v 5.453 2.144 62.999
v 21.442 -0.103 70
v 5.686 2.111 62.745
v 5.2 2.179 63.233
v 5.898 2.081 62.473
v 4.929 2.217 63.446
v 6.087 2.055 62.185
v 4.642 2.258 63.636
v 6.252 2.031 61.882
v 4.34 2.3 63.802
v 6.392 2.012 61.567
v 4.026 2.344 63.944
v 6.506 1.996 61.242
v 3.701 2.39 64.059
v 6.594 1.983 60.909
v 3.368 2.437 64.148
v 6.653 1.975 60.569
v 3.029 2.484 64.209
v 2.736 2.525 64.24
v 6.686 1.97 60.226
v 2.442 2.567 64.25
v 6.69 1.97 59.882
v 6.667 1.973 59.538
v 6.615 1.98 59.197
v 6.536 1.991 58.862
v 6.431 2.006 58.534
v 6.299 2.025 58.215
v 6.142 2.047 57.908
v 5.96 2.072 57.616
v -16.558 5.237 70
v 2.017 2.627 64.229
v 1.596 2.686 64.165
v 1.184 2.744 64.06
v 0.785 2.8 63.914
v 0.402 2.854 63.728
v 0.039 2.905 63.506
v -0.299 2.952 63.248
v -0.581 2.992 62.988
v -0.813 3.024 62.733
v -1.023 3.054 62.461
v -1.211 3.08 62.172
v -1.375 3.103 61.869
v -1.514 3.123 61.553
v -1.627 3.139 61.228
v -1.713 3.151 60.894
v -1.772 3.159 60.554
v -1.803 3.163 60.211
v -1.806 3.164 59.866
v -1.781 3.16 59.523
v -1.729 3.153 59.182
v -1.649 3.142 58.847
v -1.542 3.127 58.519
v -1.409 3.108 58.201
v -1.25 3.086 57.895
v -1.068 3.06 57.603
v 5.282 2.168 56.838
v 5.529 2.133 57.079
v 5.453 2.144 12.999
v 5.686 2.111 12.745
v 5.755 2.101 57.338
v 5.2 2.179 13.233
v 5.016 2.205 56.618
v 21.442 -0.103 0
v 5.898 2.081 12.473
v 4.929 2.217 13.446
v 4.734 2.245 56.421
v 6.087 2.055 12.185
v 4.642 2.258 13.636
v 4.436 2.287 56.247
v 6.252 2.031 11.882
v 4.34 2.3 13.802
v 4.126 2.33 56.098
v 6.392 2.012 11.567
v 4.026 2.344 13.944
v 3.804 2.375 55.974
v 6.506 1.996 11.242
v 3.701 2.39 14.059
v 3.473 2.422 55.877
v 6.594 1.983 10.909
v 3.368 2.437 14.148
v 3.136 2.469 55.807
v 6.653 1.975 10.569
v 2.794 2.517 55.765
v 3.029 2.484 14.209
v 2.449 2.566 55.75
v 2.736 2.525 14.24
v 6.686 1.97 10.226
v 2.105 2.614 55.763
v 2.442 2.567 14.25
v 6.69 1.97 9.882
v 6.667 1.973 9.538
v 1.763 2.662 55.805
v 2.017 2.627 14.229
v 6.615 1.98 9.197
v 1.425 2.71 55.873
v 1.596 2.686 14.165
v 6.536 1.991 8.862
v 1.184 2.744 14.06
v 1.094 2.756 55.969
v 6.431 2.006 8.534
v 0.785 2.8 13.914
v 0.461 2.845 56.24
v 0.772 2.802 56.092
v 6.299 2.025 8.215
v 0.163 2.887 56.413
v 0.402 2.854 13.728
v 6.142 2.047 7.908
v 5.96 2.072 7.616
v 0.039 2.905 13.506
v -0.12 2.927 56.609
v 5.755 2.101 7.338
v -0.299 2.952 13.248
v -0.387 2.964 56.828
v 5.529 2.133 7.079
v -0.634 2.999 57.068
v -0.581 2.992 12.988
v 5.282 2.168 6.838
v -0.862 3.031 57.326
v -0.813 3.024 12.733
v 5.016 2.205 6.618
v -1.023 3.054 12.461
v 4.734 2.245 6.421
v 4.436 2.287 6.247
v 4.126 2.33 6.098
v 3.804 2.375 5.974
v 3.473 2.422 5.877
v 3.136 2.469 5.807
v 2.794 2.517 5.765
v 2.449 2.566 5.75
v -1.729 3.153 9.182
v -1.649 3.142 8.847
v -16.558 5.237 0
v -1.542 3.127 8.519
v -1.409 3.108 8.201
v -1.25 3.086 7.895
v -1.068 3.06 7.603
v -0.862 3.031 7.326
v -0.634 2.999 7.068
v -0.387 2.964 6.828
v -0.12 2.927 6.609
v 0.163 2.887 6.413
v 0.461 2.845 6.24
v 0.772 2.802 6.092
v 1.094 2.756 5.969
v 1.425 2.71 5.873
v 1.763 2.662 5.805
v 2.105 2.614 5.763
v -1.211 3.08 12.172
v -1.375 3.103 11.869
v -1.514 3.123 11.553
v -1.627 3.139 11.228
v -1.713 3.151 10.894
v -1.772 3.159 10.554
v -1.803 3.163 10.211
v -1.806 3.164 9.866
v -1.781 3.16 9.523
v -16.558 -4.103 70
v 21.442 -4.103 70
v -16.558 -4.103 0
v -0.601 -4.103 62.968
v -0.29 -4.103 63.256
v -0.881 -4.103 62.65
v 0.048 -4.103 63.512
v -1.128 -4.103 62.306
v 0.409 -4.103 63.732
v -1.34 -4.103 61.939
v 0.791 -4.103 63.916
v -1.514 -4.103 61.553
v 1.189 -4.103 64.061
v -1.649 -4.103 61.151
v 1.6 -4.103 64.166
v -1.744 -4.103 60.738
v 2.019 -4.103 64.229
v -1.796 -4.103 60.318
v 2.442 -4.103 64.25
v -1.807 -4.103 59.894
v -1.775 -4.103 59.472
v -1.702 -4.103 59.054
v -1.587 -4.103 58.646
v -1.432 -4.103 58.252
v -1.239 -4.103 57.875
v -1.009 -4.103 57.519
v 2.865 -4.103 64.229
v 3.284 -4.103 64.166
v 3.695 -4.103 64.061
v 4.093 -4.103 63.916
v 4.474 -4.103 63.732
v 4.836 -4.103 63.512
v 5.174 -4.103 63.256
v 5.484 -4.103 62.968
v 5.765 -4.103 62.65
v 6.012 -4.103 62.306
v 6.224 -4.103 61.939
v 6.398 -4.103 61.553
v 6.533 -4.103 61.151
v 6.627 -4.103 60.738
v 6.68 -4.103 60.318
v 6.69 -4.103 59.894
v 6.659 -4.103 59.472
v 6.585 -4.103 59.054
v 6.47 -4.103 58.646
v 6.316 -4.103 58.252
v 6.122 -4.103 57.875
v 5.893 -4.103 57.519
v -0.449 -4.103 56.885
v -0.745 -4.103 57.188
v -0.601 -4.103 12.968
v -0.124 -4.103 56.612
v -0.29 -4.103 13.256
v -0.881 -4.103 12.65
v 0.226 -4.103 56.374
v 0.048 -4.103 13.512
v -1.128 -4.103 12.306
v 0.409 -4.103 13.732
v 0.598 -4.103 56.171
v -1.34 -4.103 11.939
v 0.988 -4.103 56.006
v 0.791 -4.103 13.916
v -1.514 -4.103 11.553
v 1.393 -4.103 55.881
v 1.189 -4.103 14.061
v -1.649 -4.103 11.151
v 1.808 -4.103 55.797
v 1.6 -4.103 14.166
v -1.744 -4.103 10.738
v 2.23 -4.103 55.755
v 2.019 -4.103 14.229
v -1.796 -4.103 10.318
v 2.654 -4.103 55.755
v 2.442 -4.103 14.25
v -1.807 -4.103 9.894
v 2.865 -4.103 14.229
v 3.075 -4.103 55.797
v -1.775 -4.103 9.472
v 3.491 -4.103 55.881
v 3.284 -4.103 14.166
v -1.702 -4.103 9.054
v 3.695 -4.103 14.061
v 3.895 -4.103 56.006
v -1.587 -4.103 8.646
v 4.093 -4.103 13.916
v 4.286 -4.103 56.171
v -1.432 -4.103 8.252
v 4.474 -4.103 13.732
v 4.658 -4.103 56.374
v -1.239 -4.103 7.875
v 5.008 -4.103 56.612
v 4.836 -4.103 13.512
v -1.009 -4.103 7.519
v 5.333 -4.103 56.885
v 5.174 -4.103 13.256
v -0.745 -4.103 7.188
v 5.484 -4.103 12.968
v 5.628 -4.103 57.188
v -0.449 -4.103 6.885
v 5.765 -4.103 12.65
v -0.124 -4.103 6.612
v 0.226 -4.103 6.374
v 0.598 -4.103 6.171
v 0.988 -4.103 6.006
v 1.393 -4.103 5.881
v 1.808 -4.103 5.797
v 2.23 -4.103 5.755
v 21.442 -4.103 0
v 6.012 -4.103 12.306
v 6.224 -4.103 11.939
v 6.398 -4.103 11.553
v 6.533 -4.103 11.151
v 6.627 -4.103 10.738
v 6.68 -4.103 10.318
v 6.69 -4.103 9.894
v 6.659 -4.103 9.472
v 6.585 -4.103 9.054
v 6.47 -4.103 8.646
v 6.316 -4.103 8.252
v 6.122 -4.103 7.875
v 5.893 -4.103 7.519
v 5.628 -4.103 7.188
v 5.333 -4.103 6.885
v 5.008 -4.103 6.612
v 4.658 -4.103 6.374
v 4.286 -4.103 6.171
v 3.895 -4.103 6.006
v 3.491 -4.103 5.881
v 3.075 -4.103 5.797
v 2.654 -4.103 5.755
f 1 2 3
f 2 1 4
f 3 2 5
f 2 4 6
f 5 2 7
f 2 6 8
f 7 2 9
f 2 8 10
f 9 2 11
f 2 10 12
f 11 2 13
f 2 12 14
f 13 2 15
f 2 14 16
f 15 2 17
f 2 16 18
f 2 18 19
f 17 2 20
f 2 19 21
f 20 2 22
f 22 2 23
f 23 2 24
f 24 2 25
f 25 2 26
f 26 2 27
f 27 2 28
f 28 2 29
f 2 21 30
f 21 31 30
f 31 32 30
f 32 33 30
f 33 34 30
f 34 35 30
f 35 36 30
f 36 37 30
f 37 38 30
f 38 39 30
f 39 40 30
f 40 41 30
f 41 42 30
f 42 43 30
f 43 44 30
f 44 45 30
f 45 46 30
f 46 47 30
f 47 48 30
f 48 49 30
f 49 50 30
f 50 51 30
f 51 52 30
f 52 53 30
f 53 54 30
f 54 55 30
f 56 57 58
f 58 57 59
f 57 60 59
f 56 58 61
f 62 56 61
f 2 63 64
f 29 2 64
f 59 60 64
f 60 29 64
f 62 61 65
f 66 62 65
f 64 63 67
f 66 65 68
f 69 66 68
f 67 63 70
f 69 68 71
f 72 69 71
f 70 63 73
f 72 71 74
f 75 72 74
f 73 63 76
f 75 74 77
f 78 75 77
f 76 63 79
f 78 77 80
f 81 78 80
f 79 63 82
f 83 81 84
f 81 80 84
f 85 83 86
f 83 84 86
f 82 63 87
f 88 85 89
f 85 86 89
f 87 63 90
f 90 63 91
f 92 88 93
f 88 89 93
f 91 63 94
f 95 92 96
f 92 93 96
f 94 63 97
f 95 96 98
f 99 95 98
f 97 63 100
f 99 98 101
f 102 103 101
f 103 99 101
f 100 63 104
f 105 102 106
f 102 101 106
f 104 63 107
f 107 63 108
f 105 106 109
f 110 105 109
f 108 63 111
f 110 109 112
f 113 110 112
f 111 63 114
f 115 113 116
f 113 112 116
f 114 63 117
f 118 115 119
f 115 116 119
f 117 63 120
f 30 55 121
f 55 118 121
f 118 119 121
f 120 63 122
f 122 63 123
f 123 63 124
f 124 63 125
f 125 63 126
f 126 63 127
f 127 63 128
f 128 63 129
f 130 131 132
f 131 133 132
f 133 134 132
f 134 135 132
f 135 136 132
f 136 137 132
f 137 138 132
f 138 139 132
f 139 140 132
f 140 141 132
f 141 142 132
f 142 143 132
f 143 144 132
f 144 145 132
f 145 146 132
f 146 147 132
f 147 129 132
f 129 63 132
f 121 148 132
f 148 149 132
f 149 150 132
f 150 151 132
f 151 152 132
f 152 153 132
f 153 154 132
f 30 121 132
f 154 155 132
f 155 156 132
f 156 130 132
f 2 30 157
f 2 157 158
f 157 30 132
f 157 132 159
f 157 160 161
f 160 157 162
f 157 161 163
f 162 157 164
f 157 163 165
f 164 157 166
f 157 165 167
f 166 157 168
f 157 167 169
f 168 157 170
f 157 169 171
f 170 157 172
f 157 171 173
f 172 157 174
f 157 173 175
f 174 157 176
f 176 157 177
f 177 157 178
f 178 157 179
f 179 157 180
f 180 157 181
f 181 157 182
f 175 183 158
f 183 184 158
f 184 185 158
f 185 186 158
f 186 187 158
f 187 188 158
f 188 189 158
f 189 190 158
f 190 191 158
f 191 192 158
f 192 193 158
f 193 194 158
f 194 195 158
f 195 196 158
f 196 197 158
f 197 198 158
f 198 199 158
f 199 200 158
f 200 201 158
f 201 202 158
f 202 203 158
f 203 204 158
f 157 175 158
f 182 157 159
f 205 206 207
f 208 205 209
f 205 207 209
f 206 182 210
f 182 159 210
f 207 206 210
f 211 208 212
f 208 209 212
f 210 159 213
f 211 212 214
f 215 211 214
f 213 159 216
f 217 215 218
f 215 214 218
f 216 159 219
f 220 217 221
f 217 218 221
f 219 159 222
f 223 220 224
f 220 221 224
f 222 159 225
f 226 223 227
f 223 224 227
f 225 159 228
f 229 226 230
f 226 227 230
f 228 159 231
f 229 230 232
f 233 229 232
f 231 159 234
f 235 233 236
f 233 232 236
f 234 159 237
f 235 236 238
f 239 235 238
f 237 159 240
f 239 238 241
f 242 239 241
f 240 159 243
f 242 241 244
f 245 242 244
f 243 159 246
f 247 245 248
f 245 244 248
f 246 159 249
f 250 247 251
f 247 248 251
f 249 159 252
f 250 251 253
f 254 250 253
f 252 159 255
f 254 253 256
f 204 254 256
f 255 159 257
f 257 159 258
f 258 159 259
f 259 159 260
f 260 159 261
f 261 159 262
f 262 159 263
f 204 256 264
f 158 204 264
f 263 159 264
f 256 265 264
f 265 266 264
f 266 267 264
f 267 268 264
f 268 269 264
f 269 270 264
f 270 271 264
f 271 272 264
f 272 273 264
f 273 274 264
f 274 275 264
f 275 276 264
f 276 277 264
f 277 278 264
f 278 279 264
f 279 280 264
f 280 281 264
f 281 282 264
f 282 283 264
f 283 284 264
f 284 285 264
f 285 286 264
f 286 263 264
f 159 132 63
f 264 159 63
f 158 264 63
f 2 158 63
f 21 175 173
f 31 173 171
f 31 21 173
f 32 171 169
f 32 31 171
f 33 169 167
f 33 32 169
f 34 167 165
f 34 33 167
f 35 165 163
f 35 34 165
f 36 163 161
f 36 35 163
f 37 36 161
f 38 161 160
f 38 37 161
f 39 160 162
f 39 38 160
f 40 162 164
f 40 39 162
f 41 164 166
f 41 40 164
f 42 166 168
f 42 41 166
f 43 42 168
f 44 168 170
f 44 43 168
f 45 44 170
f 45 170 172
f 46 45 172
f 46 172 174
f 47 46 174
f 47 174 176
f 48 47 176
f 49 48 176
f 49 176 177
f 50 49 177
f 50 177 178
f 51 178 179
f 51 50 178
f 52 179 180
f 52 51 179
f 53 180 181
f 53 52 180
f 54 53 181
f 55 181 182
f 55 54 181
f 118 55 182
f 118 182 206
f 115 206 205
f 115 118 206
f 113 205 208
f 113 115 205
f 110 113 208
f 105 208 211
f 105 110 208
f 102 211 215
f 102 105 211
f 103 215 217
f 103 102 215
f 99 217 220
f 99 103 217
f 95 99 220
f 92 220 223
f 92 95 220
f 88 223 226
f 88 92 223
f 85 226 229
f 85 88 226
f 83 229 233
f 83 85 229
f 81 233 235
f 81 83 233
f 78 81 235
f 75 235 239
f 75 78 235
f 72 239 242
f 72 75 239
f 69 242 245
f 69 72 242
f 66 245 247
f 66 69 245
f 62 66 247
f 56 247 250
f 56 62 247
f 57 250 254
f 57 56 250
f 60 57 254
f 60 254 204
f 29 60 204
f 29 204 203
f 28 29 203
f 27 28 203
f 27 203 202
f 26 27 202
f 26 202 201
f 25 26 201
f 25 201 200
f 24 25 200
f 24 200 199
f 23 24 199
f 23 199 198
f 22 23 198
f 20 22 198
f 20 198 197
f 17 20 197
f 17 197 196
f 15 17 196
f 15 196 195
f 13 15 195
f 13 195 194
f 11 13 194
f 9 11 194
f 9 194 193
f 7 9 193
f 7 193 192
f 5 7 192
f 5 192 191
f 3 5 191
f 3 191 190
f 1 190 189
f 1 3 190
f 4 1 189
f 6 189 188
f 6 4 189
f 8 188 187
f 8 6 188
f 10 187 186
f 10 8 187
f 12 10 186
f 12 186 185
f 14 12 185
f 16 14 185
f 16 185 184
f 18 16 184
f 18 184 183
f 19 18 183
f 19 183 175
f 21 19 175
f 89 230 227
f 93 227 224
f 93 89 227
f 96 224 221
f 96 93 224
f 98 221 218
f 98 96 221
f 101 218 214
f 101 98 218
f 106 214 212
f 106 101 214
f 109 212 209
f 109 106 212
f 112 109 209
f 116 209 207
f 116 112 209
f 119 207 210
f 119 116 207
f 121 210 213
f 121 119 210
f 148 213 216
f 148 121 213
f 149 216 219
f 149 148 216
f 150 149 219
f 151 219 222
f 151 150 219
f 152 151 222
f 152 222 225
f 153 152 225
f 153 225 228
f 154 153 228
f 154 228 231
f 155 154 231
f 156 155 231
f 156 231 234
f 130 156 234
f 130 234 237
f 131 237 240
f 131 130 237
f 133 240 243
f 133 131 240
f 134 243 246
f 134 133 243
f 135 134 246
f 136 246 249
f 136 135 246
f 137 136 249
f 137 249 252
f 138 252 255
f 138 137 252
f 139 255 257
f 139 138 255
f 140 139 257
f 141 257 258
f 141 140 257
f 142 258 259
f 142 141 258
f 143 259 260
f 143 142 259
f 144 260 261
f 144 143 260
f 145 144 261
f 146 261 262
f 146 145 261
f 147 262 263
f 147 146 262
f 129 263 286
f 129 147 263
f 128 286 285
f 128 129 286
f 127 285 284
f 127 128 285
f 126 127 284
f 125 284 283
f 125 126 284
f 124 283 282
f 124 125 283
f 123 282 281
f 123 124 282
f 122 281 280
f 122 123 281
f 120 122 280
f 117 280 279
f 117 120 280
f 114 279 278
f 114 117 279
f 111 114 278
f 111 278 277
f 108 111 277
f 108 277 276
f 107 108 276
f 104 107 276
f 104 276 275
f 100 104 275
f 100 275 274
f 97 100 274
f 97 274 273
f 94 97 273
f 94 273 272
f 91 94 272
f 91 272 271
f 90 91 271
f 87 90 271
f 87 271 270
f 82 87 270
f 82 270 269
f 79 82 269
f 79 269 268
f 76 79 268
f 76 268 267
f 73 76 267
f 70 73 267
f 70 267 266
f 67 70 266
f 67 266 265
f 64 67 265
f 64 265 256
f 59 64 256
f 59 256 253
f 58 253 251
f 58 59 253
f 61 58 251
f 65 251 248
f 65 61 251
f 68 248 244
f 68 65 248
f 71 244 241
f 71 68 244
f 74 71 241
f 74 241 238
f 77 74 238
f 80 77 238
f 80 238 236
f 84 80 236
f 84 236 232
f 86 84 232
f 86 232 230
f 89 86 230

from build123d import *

# Parameters (mm, degrees)
DODANIE_WYCI_GNI_CIE1_DEPTH = 70
SZKIC2_R                    = 4.25
WYTNIJ_WYCI_GNI_CIE1_DEPTH  = 10


with BuildPart() as part:
    # Szkic1 → Dodanie-wyciągnięcie1 (new body)
    with BuildSketch(Plane.XY):
        Polygon((-16.558198873, 5.237130444), (-16.558198873, -4.103421275), (21.441801127, -4.103421275), (21.441801127, -0.103421275), align=None)
    extrude(amount=DODANIE_WYCI_GNI_CIE1_DEPTH)

    # Szkic2 → Wytnij-wyciągnięcie1 (cut)
    with BuildSketch(Plane(origin=(0, 5.237130444, 0), x_dir=(-1, 0, 0), z_dir=(0, -1, 0))):
        with Locations(Location((-2.441801127, -60, 0), (0, 0, 270))):
            Circle(SZKIC2_R)
        with Locations(Location((-2.441801127, -10, 0), (0, 0, 270))):
            Circle(SZKIC2_R)
    extrude(amount=WYTNIJ_WYCI_GNI_CIE1_DEPTH, mode=Mode.SUBTRACT)


solid = part.part
